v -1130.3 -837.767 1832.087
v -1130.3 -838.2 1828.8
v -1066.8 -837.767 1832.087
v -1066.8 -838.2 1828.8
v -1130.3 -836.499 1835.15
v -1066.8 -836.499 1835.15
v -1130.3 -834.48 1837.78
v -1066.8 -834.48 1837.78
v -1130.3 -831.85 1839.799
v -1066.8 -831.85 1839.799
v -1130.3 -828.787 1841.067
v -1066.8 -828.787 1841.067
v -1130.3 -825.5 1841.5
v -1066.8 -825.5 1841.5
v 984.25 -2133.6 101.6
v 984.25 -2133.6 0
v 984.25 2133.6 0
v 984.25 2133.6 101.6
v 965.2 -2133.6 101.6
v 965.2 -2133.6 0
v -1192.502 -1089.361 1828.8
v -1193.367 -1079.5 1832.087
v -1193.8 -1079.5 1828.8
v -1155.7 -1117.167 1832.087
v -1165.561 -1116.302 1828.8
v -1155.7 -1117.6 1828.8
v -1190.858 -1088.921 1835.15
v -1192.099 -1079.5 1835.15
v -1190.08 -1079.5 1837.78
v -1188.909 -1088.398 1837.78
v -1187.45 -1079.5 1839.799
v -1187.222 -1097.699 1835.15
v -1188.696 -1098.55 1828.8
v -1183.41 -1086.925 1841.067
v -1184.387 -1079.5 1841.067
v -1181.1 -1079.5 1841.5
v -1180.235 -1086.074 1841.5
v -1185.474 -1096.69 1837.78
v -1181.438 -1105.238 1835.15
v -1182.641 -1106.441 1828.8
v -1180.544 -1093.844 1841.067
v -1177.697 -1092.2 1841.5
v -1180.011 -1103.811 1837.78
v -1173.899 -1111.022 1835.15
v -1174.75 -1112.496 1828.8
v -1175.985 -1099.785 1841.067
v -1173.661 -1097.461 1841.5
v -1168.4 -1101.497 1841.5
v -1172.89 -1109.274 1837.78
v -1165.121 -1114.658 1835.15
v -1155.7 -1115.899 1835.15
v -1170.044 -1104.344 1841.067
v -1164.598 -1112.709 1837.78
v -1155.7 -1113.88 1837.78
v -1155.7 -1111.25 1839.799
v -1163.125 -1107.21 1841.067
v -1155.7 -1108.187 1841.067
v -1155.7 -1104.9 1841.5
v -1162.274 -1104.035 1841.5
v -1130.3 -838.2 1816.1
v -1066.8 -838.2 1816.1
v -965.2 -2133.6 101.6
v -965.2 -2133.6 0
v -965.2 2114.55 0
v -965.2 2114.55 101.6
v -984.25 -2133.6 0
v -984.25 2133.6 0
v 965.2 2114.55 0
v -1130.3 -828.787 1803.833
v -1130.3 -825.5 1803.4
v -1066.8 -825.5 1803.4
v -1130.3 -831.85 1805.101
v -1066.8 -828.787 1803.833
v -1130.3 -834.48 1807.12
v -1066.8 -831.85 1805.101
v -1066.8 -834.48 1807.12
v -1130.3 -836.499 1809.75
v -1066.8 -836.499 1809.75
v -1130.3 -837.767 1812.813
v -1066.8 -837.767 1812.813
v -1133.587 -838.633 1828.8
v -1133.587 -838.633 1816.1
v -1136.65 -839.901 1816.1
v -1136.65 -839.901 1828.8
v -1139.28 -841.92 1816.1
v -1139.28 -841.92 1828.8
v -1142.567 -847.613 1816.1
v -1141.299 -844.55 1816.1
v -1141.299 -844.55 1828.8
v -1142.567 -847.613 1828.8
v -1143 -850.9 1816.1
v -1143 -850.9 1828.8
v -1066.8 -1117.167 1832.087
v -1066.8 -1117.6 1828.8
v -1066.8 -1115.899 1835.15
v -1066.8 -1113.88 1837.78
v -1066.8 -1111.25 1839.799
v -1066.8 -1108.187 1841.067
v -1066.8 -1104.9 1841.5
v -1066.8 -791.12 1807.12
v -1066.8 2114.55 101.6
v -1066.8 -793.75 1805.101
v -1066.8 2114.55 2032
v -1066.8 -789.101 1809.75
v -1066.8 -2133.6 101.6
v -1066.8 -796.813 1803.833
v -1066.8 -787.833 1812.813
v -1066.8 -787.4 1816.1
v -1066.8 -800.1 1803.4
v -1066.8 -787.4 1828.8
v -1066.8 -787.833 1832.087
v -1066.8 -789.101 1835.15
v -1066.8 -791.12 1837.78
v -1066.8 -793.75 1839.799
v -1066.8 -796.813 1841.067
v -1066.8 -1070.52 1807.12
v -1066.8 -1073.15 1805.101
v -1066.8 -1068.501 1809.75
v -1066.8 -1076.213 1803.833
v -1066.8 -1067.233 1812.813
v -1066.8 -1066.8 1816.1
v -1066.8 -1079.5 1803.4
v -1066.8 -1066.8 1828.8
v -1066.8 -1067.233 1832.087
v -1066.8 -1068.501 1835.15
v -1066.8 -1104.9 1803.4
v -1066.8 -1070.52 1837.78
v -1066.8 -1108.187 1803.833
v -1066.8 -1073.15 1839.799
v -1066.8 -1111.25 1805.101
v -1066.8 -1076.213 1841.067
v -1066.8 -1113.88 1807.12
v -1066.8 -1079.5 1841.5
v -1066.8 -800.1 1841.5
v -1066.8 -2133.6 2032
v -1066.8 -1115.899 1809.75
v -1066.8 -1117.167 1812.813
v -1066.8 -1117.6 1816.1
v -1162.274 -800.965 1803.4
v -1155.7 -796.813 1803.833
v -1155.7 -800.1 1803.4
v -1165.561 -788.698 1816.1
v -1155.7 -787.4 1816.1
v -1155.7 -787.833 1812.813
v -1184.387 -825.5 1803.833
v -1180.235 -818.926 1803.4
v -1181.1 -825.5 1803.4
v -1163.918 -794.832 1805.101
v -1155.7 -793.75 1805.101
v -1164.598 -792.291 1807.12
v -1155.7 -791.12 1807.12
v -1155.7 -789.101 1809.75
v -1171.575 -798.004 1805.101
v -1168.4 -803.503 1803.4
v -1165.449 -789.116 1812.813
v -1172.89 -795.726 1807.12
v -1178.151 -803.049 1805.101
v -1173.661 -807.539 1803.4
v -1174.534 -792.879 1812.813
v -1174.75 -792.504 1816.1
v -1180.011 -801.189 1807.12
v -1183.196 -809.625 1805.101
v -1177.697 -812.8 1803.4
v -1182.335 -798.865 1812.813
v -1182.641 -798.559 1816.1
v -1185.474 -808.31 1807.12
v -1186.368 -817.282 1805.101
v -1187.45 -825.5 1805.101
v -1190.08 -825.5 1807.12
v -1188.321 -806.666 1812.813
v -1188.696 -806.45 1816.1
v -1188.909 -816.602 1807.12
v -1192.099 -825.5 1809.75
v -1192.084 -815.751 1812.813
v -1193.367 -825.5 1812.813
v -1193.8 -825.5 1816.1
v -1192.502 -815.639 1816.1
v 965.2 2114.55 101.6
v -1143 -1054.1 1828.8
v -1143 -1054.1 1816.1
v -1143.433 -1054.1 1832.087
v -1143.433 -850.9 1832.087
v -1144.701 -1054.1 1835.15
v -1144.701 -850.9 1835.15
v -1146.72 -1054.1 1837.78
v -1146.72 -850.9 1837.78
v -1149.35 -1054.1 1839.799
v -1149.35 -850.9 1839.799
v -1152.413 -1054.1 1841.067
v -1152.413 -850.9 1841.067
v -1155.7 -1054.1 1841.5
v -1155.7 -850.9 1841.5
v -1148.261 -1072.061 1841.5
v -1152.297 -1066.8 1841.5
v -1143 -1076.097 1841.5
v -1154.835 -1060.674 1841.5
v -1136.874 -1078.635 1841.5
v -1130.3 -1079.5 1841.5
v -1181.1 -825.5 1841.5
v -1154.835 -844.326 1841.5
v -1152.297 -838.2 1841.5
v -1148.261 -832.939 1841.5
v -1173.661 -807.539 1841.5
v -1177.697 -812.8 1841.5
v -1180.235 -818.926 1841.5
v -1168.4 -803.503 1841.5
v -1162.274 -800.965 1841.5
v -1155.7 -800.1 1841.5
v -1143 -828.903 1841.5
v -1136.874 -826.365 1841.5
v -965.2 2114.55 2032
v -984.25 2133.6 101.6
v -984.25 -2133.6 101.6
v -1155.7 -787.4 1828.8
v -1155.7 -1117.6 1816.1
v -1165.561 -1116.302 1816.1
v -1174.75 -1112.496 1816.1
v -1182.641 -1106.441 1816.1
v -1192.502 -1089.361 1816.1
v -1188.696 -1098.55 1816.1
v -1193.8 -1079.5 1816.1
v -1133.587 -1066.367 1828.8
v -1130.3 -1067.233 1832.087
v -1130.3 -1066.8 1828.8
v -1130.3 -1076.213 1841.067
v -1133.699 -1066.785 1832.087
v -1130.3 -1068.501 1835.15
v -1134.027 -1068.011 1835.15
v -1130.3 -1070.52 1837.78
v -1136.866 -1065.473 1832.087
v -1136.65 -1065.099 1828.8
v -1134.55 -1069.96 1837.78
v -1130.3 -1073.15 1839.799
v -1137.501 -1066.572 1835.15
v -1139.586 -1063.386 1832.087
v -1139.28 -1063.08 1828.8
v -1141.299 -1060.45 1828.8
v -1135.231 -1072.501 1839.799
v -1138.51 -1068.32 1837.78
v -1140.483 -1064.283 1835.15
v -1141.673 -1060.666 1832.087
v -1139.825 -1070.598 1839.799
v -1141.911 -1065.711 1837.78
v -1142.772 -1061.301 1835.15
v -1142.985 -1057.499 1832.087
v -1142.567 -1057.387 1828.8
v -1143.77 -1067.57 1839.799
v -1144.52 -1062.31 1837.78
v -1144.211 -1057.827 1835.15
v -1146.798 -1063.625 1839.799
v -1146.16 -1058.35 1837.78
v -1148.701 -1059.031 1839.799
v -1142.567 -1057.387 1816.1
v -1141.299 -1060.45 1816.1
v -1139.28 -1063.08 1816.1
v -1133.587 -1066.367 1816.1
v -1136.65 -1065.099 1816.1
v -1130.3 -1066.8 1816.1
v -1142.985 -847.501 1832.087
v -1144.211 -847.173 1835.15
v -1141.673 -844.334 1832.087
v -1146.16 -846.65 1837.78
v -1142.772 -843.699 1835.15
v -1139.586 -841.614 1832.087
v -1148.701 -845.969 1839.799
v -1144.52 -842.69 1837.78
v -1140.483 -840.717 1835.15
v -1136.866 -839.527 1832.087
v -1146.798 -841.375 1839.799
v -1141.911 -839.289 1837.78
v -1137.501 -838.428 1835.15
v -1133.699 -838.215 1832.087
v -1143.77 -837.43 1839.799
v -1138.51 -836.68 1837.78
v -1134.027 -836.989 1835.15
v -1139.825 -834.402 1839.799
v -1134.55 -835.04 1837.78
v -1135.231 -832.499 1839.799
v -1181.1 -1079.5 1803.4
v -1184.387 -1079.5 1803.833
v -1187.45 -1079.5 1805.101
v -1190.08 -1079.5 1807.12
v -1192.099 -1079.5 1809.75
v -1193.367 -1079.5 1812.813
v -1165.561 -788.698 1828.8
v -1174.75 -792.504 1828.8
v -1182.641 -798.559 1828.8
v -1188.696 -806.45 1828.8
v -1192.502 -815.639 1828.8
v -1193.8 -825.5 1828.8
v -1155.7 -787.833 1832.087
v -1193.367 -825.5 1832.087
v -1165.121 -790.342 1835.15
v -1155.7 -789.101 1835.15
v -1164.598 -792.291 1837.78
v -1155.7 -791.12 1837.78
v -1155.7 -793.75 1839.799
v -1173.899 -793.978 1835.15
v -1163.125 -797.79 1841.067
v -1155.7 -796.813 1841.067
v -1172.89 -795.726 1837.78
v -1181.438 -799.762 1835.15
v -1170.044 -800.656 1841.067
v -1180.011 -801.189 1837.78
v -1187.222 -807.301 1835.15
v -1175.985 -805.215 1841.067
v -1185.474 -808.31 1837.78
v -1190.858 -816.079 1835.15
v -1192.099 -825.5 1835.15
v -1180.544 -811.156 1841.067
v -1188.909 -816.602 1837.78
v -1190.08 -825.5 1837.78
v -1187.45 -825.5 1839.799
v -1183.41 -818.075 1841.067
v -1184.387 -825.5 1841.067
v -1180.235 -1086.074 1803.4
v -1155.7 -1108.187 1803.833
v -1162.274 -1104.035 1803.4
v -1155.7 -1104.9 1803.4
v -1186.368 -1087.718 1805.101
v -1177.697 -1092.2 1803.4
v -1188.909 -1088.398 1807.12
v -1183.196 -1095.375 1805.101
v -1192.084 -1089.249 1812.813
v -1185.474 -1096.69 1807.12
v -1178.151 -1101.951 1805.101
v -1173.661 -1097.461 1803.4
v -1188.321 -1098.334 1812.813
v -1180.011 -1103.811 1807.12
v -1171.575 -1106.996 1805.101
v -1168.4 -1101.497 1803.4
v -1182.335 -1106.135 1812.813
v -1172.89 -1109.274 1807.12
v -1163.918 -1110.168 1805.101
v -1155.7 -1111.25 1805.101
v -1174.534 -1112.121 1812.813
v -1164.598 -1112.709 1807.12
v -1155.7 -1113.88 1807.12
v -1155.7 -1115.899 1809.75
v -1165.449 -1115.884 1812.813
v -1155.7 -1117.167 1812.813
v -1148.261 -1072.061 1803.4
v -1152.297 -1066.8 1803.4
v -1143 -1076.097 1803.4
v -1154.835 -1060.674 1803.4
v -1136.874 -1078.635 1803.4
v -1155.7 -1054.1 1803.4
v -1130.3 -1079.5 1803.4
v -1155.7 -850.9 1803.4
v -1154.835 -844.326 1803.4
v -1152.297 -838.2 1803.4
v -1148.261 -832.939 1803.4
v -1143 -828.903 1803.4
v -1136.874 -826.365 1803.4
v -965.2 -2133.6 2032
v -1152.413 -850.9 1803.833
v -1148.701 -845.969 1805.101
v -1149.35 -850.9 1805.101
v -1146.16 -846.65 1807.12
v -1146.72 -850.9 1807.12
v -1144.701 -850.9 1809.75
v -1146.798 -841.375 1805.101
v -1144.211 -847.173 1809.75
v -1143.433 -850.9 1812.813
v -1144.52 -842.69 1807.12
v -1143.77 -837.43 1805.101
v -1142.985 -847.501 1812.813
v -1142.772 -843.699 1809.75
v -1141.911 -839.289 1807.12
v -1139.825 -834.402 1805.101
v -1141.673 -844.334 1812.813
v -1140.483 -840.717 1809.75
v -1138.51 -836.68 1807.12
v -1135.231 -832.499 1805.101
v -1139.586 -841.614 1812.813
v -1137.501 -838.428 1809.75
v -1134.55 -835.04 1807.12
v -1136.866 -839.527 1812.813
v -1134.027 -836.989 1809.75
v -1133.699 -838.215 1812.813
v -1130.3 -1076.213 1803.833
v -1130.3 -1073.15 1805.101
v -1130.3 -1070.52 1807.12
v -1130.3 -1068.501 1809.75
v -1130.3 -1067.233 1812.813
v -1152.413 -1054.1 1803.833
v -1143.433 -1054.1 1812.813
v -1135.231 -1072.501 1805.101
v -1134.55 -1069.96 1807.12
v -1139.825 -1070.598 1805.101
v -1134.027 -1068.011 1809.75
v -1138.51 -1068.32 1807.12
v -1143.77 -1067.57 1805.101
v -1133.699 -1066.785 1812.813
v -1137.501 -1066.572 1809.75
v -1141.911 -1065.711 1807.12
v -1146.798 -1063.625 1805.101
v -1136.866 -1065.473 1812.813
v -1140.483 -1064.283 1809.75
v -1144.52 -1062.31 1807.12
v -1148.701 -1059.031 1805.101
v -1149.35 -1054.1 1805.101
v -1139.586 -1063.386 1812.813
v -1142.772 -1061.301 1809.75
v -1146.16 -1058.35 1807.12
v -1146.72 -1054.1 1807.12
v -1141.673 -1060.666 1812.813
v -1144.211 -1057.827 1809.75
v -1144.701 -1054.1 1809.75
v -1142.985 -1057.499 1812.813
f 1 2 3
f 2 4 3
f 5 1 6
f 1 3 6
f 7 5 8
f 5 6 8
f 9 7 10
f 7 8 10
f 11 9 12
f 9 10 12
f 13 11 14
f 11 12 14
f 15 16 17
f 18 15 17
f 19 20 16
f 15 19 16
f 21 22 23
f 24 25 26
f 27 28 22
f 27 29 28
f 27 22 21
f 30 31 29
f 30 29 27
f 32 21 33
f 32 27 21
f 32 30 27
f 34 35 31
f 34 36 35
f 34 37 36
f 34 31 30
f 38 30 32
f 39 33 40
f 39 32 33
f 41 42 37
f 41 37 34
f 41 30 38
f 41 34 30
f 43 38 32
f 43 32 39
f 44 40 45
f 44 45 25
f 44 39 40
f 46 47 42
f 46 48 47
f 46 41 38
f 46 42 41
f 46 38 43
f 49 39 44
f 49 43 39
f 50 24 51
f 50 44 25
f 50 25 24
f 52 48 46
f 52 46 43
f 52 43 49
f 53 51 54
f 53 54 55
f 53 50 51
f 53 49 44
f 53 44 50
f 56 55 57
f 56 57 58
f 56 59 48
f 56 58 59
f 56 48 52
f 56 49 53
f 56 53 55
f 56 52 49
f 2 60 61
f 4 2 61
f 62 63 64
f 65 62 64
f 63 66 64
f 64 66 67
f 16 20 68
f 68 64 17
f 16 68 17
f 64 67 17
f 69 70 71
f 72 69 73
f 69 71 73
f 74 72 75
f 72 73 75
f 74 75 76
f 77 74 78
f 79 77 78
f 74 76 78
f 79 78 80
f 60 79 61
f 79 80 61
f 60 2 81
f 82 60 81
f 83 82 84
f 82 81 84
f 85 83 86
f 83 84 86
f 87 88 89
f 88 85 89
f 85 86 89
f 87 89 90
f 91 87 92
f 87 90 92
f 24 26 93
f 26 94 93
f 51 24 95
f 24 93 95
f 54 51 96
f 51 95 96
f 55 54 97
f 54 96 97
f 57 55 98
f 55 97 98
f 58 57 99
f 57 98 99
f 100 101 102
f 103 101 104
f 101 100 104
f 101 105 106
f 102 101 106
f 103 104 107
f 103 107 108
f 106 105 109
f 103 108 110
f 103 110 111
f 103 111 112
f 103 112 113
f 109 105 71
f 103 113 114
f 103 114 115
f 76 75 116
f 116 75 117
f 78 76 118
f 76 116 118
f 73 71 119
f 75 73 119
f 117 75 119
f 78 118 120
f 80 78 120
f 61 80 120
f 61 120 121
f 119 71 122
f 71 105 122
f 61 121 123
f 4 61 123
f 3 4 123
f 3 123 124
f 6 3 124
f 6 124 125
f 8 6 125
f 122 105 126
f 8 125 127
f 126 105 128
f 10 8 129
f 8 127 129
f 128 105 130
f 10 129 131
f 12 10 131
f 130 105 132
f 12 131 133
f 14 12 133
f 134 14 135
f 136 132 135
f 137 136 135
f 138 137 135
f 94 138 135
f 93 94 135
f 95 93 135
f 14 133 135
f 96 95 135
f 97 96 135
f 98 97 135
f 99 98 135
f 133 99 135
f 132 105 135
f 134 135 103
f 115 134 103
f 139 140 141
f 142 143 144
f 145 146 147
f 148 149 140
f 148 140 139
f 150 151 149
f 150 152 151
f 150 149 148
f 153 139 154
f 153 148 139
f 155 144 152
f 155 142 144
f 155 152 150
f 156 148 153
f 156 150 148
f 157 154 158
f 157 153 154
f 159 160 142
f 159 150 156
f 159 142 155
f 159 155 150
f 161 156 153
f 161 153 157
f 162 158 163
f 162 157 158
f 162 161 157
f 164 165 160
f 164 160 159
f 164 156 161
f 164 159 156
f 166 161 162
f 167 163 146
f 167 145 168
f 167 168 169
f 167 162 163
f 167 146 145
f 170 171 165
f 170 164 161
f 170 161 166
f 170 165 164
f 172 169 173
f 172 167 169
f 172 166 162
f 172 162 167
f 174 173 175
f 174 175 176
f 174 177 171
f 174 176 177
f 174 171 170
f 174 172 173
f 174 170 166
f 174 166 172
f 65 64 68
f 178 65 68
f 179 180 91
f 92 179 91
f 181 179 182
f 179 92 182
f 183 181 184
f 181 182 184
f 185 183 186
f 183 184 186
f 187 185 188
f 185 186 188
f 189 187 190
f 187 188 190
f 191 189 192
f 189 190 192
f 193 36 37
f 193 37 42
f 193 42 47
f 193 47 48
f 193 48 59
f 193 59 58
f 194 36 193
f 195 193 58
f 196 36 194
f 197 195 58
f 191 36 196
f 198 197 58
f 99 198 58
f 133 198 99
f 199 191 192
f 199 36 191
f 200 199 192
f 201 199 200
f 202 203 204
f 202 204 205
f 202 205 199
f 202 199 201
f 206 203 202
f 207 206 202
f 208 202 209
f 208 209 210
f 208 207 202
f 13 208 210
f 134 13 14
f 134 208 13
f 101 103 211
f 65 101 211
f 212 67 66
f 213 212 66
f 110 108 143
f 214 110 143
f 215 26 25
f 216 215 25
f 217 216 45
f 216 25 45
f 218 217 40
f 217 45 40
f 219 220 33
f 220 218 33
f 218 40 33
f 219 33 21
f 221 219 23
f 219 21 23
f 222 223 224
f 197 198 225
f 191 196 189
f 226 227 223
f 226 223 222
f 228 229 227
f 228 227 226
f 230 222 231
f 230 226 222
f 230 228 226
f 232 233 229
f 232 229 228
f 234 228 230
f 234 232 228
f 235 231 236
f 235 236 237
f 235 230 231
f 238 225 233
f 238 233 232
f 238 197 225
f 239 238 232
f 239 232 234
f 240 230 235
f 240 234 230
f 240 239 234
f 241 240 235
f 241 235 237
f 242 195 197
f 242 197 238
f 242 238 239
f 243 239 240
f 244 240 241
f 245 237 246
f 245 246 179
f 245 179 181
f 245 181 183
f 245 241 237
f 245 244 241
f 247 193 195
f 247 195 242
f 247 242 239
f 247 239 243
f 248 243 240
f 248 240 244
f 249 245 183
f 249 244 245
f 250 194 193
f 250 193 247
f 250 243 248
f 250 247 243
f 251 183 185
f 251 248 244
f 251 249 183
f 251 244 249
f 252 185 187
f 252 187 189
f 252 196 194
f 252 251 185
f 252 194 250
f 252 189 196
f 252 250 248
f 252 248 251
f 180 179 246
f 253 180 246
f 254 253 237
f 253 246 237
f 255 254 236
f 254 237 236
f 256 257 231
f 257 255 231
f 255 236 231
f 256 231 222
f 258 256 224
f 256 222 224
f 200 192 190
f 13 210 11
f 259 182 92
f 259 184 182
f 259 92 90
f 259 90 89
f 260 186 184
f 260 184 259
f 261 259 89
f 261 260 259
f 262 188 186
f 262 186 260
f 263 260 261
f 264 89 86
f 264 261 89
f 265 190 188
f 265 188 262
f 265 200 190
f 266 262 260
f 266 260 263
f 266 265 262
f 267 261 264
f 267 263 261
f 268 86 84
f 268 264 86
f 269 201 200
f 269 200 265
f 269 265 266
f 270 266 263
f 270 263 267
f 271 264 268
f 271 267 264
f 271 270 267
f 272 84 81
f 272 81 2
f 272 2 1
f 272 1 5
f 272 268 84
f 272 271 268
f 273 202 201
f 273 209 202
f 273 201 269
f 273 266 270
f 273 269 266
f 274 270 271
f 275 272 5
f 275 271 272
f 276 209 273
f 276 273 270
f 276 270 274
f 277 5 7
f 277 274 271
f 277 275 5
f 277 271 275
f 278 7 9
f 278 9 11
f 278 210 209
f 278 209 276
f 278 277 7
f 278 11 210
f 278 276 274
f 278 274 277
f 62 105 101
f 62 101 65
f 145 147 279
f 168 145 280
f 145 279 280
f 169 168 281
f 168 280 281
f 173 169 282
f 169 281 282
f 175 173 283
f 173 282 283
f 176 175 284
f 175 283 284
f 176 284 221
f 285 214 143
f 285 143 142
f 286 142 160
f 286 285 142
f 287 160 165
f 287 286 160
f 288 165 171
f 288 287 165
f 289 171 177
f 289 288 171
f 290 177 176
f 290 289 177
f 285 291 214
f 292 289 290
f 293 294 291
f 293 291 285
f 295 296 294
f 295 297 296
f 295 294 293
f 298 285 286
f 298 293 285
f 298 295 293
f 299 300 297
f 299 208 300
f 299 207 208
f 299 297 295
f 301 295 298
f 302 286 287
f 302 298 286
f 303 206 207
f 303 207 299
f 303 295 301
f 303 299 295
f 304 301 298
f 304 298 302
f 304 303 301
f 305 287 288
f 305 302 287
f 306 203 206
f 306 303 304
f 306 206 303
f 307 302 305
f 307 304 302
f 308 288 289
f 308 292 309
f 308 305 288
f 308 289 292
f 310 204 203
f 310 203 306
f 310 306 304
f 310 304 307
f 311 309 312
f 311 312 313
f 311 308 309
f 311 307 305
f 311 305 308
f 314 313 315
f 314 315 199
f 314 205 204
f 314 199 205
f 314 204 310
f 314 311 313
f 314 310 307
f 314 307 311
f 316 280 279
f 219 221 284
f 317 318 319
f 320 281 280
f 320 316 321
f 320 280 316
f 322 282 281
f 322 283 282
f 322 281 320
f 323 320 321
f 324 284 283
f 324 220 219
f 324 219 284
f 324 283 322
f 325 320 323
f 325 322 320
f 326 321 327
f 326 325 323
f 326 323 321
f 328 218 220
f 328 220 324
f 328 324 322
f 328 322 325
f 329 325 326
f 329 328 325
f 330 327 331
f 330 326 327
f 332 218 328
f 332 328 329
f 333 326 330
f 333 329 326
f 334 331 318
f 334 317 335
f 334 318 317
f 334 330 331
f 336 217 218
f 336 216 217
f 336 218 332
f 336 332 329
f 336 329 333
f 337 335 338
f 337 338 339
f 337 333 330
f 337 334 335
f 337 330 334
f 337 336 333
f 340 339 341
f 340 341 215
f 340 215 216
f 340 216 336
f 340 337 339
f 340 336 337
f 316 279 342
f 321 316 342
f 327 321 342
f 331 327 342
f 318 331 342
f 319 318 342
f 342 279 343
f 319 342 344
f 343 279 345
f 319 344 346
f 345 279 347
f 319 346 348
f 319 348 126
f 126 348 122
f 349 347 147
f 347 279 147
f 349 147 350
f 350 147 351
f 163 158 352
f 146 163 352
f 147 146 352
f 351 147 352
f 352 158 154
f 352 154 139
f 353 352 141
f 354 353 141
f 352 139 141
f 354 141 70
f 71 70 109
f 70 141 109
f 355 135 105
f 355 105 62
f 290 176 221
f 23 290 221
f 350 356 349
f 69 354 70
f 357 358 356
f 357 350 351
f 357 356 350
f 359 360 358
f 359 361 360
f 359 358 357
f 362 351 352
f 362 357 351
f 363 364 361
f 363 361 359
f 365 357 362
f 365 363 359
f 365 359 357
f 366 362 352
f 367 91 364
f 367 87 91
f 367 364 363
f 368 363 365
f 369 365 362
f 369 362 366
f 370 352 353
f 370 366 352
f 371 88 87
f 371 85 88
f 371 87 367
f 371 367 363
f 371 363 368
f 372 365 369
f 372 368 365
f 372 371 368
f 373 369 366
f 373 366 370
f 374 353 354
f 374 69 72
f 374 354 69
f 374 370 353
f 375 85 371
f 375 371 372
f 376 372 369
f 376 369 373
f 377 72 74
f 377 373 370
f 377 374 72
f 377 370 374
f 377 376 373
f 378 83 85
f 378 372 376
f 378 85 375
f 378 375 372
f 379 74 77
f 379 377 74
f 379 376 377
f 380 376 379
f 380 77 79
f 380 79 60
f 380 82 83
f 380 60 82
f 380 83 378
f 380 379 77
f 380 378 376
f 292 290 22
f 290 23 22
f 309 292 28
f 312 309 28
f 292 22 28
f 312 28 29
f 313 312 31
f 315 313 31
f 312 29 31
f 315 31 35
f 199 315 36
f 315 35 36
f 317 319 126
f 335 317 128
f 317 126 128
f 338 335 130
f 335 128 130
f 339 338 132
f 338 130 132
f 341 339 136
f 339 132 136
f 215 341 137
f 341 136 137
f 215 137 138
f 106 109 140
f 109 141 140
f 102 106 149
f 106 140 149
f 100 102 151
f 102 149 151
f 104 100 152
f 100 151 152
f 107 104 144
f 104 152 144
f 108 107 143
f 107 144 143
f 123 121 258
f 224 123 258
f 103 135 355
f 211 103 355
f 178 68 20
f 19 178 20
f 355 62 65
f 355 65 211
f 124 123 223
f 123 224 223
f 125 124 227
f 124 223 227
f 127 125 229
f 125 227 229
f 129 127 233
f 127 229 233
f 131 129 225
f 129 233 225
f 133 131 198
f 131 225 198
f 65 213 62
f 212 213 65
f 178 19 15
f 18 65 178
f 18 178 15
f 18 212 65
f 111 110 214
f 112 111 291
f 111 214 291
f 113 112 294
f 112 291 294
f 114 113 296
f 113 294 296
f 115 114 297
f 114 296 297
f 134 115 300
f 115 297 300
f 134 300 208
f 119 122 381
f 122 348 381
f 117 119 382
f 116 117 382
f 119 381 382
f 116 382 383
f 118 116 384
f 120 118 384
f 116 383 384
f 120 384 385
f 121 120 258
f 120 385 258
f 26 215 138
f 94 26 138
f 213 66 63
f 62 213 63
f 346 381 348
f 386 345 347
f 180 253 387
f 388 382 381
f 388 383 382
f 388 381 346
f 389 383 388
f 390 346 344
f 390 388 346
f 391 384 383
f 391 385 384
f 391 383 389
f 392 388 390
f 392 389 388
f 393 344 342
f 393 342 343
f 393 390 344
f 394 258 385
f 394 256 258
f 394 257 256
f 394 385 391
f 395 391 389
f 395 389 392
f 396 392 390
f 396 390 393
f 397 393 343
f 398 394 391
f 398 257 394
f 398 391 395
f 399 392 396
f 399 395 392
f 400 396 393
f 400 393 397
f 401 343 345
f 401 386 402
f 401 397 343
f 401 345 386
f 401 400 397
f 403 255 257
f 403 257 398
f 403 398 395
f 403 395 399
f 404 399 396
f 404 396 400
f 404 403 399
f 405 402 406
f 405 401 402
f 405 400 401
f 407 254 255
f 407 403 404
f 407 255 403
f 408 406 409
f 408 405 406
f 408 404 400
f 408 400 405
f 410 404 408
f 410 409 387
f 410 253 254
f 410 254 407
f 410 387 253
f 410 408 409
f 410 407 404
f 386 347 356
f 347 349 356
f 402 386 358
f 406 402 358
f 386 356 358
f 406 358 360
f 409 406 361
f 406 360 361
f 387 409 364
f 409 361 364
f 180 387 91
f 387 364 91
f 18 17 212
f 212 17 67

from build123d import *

# Parameters (mm, degrees)
BOSS_EXTRUDE1_DEPTH = 101.6
SKETCH2_W           = 101.6
SKETCH2_H           = 1930.4
BOSS_EXTRUDE2_DEPTH = 4248.15
BOSS_EXTRUDE3_START = -228.6
BOSS_EXTRUDE3_DEPTH = 38.1
FILLET1_R           = 38.1
FILLET2_R           = 12.7
FILLET3_R           = 12.7


with BuildPart() as part:
    # Sketch1 → Boss-Extrude1 (new body)
    with BuildSketch(Plane.XY):
        Polygon((965.2, 2114.55), (965.2, -2133.6), (984.25, -2133.6), (984.25, 2133.6), (-984.25, 2133.6), (-984.25, -2133.6), (-965.2, -2133.6), (-965.2, 2114.55), align=None)
    extrude(amount=BOSS_EXTRUDE1_DEPTH)


with BuildPart() as body_2:
    # Sketch2 → Boss-Extrude2 (new body)
    with BuildSketch(Plane.XZ.offset(2133.6)):
        with Locations((-1016, 1066.8)):
            Rectangle(SKETCH2_W, SKETCH2_H)
    extrude(amount=-BOSS_EXTRUDE2_DEPTH)

    # Sketch3 → Boss-Extrude3 (add)
    with BuildSketch(Plane.XY.offset(2032).offset(BOSS_EXTRUDE3_START)):
        Polygon((-1066.8, -787.4), (-1193.8, -787.4), (-1193.8, -1117.6), (-1066.8, -1117.6), (-1066.8, -1066.8), (-1143, -1066.8), (-1143, -838.2), (-1066.8, -838.2), align=None)
    extrude(amount=BOSS_EXTRUDE3_DEPTH)

    # Fillet1
    fillet1_edges = [body_2.edges().sort_by_distance(p)[0] for p in [
        (-1193.8, -787.4, 1822.45),
        (-1193.8, -1117.6, 1822.45),
    ]]
    fillet(fillet1_edges, radius=FILLET1_R)

    # Fillet2
    fillet2_edges = [body_2.edges().sort_by_distance(p)[0] for p in [
        (-1143, -1066.8, 1822.45),
        (-1143, -838.2, 1822.45),
    ]]
    fillet(fillet2_edges, radius=FILLET2_R)

    # Fillet3
    fillet3_edges = [body_2.edges().sort_by_distance(p)[0] for p in [
        (-1111.25, -787.4, 1803.4),
        (-1098.55, -1066.8, 1803.4),
        (-1111.25, -787.4, 1841.5),
        (-1098.55, -1066.8, 1841.5),
        (-1111.25, -1117.6, 1803.4),
        (-1111.25, -1117.6, 1841.5),
        (-1193.8, -952.5, 1803.4),
        (-1182.640768363, -798.559231637, 1803.4),
        (-1182.640768363, -1106.440768363, 1803.4),
        (-1193.8, -952.5, 1841.5),
        (-1182.640768363, -798.559231637, 1841.5),
        (-1182.640768363, -1106.440768363, 1841.5),
        (-1143, -952.5, 1803.4),
        (-1143, -952.5, 1841.5),
        (-1098.55, -838.2, 1803.4),
        (-1098.55, -838.2, 1841.5),
        (-1139.280256121, -1063.080256121, 1803.4),
        (-1139.280256121, -1063.080256121, 1841.5),
        (-1139.280256121, -841.919743879, 1803.4),
        (-1139.280256121, -841.919743879, 1841.5),
    ]]
    fillet(fillet3_edges, radius=FILLET3_R)


solid = Compound([part.part, body_2.part])
